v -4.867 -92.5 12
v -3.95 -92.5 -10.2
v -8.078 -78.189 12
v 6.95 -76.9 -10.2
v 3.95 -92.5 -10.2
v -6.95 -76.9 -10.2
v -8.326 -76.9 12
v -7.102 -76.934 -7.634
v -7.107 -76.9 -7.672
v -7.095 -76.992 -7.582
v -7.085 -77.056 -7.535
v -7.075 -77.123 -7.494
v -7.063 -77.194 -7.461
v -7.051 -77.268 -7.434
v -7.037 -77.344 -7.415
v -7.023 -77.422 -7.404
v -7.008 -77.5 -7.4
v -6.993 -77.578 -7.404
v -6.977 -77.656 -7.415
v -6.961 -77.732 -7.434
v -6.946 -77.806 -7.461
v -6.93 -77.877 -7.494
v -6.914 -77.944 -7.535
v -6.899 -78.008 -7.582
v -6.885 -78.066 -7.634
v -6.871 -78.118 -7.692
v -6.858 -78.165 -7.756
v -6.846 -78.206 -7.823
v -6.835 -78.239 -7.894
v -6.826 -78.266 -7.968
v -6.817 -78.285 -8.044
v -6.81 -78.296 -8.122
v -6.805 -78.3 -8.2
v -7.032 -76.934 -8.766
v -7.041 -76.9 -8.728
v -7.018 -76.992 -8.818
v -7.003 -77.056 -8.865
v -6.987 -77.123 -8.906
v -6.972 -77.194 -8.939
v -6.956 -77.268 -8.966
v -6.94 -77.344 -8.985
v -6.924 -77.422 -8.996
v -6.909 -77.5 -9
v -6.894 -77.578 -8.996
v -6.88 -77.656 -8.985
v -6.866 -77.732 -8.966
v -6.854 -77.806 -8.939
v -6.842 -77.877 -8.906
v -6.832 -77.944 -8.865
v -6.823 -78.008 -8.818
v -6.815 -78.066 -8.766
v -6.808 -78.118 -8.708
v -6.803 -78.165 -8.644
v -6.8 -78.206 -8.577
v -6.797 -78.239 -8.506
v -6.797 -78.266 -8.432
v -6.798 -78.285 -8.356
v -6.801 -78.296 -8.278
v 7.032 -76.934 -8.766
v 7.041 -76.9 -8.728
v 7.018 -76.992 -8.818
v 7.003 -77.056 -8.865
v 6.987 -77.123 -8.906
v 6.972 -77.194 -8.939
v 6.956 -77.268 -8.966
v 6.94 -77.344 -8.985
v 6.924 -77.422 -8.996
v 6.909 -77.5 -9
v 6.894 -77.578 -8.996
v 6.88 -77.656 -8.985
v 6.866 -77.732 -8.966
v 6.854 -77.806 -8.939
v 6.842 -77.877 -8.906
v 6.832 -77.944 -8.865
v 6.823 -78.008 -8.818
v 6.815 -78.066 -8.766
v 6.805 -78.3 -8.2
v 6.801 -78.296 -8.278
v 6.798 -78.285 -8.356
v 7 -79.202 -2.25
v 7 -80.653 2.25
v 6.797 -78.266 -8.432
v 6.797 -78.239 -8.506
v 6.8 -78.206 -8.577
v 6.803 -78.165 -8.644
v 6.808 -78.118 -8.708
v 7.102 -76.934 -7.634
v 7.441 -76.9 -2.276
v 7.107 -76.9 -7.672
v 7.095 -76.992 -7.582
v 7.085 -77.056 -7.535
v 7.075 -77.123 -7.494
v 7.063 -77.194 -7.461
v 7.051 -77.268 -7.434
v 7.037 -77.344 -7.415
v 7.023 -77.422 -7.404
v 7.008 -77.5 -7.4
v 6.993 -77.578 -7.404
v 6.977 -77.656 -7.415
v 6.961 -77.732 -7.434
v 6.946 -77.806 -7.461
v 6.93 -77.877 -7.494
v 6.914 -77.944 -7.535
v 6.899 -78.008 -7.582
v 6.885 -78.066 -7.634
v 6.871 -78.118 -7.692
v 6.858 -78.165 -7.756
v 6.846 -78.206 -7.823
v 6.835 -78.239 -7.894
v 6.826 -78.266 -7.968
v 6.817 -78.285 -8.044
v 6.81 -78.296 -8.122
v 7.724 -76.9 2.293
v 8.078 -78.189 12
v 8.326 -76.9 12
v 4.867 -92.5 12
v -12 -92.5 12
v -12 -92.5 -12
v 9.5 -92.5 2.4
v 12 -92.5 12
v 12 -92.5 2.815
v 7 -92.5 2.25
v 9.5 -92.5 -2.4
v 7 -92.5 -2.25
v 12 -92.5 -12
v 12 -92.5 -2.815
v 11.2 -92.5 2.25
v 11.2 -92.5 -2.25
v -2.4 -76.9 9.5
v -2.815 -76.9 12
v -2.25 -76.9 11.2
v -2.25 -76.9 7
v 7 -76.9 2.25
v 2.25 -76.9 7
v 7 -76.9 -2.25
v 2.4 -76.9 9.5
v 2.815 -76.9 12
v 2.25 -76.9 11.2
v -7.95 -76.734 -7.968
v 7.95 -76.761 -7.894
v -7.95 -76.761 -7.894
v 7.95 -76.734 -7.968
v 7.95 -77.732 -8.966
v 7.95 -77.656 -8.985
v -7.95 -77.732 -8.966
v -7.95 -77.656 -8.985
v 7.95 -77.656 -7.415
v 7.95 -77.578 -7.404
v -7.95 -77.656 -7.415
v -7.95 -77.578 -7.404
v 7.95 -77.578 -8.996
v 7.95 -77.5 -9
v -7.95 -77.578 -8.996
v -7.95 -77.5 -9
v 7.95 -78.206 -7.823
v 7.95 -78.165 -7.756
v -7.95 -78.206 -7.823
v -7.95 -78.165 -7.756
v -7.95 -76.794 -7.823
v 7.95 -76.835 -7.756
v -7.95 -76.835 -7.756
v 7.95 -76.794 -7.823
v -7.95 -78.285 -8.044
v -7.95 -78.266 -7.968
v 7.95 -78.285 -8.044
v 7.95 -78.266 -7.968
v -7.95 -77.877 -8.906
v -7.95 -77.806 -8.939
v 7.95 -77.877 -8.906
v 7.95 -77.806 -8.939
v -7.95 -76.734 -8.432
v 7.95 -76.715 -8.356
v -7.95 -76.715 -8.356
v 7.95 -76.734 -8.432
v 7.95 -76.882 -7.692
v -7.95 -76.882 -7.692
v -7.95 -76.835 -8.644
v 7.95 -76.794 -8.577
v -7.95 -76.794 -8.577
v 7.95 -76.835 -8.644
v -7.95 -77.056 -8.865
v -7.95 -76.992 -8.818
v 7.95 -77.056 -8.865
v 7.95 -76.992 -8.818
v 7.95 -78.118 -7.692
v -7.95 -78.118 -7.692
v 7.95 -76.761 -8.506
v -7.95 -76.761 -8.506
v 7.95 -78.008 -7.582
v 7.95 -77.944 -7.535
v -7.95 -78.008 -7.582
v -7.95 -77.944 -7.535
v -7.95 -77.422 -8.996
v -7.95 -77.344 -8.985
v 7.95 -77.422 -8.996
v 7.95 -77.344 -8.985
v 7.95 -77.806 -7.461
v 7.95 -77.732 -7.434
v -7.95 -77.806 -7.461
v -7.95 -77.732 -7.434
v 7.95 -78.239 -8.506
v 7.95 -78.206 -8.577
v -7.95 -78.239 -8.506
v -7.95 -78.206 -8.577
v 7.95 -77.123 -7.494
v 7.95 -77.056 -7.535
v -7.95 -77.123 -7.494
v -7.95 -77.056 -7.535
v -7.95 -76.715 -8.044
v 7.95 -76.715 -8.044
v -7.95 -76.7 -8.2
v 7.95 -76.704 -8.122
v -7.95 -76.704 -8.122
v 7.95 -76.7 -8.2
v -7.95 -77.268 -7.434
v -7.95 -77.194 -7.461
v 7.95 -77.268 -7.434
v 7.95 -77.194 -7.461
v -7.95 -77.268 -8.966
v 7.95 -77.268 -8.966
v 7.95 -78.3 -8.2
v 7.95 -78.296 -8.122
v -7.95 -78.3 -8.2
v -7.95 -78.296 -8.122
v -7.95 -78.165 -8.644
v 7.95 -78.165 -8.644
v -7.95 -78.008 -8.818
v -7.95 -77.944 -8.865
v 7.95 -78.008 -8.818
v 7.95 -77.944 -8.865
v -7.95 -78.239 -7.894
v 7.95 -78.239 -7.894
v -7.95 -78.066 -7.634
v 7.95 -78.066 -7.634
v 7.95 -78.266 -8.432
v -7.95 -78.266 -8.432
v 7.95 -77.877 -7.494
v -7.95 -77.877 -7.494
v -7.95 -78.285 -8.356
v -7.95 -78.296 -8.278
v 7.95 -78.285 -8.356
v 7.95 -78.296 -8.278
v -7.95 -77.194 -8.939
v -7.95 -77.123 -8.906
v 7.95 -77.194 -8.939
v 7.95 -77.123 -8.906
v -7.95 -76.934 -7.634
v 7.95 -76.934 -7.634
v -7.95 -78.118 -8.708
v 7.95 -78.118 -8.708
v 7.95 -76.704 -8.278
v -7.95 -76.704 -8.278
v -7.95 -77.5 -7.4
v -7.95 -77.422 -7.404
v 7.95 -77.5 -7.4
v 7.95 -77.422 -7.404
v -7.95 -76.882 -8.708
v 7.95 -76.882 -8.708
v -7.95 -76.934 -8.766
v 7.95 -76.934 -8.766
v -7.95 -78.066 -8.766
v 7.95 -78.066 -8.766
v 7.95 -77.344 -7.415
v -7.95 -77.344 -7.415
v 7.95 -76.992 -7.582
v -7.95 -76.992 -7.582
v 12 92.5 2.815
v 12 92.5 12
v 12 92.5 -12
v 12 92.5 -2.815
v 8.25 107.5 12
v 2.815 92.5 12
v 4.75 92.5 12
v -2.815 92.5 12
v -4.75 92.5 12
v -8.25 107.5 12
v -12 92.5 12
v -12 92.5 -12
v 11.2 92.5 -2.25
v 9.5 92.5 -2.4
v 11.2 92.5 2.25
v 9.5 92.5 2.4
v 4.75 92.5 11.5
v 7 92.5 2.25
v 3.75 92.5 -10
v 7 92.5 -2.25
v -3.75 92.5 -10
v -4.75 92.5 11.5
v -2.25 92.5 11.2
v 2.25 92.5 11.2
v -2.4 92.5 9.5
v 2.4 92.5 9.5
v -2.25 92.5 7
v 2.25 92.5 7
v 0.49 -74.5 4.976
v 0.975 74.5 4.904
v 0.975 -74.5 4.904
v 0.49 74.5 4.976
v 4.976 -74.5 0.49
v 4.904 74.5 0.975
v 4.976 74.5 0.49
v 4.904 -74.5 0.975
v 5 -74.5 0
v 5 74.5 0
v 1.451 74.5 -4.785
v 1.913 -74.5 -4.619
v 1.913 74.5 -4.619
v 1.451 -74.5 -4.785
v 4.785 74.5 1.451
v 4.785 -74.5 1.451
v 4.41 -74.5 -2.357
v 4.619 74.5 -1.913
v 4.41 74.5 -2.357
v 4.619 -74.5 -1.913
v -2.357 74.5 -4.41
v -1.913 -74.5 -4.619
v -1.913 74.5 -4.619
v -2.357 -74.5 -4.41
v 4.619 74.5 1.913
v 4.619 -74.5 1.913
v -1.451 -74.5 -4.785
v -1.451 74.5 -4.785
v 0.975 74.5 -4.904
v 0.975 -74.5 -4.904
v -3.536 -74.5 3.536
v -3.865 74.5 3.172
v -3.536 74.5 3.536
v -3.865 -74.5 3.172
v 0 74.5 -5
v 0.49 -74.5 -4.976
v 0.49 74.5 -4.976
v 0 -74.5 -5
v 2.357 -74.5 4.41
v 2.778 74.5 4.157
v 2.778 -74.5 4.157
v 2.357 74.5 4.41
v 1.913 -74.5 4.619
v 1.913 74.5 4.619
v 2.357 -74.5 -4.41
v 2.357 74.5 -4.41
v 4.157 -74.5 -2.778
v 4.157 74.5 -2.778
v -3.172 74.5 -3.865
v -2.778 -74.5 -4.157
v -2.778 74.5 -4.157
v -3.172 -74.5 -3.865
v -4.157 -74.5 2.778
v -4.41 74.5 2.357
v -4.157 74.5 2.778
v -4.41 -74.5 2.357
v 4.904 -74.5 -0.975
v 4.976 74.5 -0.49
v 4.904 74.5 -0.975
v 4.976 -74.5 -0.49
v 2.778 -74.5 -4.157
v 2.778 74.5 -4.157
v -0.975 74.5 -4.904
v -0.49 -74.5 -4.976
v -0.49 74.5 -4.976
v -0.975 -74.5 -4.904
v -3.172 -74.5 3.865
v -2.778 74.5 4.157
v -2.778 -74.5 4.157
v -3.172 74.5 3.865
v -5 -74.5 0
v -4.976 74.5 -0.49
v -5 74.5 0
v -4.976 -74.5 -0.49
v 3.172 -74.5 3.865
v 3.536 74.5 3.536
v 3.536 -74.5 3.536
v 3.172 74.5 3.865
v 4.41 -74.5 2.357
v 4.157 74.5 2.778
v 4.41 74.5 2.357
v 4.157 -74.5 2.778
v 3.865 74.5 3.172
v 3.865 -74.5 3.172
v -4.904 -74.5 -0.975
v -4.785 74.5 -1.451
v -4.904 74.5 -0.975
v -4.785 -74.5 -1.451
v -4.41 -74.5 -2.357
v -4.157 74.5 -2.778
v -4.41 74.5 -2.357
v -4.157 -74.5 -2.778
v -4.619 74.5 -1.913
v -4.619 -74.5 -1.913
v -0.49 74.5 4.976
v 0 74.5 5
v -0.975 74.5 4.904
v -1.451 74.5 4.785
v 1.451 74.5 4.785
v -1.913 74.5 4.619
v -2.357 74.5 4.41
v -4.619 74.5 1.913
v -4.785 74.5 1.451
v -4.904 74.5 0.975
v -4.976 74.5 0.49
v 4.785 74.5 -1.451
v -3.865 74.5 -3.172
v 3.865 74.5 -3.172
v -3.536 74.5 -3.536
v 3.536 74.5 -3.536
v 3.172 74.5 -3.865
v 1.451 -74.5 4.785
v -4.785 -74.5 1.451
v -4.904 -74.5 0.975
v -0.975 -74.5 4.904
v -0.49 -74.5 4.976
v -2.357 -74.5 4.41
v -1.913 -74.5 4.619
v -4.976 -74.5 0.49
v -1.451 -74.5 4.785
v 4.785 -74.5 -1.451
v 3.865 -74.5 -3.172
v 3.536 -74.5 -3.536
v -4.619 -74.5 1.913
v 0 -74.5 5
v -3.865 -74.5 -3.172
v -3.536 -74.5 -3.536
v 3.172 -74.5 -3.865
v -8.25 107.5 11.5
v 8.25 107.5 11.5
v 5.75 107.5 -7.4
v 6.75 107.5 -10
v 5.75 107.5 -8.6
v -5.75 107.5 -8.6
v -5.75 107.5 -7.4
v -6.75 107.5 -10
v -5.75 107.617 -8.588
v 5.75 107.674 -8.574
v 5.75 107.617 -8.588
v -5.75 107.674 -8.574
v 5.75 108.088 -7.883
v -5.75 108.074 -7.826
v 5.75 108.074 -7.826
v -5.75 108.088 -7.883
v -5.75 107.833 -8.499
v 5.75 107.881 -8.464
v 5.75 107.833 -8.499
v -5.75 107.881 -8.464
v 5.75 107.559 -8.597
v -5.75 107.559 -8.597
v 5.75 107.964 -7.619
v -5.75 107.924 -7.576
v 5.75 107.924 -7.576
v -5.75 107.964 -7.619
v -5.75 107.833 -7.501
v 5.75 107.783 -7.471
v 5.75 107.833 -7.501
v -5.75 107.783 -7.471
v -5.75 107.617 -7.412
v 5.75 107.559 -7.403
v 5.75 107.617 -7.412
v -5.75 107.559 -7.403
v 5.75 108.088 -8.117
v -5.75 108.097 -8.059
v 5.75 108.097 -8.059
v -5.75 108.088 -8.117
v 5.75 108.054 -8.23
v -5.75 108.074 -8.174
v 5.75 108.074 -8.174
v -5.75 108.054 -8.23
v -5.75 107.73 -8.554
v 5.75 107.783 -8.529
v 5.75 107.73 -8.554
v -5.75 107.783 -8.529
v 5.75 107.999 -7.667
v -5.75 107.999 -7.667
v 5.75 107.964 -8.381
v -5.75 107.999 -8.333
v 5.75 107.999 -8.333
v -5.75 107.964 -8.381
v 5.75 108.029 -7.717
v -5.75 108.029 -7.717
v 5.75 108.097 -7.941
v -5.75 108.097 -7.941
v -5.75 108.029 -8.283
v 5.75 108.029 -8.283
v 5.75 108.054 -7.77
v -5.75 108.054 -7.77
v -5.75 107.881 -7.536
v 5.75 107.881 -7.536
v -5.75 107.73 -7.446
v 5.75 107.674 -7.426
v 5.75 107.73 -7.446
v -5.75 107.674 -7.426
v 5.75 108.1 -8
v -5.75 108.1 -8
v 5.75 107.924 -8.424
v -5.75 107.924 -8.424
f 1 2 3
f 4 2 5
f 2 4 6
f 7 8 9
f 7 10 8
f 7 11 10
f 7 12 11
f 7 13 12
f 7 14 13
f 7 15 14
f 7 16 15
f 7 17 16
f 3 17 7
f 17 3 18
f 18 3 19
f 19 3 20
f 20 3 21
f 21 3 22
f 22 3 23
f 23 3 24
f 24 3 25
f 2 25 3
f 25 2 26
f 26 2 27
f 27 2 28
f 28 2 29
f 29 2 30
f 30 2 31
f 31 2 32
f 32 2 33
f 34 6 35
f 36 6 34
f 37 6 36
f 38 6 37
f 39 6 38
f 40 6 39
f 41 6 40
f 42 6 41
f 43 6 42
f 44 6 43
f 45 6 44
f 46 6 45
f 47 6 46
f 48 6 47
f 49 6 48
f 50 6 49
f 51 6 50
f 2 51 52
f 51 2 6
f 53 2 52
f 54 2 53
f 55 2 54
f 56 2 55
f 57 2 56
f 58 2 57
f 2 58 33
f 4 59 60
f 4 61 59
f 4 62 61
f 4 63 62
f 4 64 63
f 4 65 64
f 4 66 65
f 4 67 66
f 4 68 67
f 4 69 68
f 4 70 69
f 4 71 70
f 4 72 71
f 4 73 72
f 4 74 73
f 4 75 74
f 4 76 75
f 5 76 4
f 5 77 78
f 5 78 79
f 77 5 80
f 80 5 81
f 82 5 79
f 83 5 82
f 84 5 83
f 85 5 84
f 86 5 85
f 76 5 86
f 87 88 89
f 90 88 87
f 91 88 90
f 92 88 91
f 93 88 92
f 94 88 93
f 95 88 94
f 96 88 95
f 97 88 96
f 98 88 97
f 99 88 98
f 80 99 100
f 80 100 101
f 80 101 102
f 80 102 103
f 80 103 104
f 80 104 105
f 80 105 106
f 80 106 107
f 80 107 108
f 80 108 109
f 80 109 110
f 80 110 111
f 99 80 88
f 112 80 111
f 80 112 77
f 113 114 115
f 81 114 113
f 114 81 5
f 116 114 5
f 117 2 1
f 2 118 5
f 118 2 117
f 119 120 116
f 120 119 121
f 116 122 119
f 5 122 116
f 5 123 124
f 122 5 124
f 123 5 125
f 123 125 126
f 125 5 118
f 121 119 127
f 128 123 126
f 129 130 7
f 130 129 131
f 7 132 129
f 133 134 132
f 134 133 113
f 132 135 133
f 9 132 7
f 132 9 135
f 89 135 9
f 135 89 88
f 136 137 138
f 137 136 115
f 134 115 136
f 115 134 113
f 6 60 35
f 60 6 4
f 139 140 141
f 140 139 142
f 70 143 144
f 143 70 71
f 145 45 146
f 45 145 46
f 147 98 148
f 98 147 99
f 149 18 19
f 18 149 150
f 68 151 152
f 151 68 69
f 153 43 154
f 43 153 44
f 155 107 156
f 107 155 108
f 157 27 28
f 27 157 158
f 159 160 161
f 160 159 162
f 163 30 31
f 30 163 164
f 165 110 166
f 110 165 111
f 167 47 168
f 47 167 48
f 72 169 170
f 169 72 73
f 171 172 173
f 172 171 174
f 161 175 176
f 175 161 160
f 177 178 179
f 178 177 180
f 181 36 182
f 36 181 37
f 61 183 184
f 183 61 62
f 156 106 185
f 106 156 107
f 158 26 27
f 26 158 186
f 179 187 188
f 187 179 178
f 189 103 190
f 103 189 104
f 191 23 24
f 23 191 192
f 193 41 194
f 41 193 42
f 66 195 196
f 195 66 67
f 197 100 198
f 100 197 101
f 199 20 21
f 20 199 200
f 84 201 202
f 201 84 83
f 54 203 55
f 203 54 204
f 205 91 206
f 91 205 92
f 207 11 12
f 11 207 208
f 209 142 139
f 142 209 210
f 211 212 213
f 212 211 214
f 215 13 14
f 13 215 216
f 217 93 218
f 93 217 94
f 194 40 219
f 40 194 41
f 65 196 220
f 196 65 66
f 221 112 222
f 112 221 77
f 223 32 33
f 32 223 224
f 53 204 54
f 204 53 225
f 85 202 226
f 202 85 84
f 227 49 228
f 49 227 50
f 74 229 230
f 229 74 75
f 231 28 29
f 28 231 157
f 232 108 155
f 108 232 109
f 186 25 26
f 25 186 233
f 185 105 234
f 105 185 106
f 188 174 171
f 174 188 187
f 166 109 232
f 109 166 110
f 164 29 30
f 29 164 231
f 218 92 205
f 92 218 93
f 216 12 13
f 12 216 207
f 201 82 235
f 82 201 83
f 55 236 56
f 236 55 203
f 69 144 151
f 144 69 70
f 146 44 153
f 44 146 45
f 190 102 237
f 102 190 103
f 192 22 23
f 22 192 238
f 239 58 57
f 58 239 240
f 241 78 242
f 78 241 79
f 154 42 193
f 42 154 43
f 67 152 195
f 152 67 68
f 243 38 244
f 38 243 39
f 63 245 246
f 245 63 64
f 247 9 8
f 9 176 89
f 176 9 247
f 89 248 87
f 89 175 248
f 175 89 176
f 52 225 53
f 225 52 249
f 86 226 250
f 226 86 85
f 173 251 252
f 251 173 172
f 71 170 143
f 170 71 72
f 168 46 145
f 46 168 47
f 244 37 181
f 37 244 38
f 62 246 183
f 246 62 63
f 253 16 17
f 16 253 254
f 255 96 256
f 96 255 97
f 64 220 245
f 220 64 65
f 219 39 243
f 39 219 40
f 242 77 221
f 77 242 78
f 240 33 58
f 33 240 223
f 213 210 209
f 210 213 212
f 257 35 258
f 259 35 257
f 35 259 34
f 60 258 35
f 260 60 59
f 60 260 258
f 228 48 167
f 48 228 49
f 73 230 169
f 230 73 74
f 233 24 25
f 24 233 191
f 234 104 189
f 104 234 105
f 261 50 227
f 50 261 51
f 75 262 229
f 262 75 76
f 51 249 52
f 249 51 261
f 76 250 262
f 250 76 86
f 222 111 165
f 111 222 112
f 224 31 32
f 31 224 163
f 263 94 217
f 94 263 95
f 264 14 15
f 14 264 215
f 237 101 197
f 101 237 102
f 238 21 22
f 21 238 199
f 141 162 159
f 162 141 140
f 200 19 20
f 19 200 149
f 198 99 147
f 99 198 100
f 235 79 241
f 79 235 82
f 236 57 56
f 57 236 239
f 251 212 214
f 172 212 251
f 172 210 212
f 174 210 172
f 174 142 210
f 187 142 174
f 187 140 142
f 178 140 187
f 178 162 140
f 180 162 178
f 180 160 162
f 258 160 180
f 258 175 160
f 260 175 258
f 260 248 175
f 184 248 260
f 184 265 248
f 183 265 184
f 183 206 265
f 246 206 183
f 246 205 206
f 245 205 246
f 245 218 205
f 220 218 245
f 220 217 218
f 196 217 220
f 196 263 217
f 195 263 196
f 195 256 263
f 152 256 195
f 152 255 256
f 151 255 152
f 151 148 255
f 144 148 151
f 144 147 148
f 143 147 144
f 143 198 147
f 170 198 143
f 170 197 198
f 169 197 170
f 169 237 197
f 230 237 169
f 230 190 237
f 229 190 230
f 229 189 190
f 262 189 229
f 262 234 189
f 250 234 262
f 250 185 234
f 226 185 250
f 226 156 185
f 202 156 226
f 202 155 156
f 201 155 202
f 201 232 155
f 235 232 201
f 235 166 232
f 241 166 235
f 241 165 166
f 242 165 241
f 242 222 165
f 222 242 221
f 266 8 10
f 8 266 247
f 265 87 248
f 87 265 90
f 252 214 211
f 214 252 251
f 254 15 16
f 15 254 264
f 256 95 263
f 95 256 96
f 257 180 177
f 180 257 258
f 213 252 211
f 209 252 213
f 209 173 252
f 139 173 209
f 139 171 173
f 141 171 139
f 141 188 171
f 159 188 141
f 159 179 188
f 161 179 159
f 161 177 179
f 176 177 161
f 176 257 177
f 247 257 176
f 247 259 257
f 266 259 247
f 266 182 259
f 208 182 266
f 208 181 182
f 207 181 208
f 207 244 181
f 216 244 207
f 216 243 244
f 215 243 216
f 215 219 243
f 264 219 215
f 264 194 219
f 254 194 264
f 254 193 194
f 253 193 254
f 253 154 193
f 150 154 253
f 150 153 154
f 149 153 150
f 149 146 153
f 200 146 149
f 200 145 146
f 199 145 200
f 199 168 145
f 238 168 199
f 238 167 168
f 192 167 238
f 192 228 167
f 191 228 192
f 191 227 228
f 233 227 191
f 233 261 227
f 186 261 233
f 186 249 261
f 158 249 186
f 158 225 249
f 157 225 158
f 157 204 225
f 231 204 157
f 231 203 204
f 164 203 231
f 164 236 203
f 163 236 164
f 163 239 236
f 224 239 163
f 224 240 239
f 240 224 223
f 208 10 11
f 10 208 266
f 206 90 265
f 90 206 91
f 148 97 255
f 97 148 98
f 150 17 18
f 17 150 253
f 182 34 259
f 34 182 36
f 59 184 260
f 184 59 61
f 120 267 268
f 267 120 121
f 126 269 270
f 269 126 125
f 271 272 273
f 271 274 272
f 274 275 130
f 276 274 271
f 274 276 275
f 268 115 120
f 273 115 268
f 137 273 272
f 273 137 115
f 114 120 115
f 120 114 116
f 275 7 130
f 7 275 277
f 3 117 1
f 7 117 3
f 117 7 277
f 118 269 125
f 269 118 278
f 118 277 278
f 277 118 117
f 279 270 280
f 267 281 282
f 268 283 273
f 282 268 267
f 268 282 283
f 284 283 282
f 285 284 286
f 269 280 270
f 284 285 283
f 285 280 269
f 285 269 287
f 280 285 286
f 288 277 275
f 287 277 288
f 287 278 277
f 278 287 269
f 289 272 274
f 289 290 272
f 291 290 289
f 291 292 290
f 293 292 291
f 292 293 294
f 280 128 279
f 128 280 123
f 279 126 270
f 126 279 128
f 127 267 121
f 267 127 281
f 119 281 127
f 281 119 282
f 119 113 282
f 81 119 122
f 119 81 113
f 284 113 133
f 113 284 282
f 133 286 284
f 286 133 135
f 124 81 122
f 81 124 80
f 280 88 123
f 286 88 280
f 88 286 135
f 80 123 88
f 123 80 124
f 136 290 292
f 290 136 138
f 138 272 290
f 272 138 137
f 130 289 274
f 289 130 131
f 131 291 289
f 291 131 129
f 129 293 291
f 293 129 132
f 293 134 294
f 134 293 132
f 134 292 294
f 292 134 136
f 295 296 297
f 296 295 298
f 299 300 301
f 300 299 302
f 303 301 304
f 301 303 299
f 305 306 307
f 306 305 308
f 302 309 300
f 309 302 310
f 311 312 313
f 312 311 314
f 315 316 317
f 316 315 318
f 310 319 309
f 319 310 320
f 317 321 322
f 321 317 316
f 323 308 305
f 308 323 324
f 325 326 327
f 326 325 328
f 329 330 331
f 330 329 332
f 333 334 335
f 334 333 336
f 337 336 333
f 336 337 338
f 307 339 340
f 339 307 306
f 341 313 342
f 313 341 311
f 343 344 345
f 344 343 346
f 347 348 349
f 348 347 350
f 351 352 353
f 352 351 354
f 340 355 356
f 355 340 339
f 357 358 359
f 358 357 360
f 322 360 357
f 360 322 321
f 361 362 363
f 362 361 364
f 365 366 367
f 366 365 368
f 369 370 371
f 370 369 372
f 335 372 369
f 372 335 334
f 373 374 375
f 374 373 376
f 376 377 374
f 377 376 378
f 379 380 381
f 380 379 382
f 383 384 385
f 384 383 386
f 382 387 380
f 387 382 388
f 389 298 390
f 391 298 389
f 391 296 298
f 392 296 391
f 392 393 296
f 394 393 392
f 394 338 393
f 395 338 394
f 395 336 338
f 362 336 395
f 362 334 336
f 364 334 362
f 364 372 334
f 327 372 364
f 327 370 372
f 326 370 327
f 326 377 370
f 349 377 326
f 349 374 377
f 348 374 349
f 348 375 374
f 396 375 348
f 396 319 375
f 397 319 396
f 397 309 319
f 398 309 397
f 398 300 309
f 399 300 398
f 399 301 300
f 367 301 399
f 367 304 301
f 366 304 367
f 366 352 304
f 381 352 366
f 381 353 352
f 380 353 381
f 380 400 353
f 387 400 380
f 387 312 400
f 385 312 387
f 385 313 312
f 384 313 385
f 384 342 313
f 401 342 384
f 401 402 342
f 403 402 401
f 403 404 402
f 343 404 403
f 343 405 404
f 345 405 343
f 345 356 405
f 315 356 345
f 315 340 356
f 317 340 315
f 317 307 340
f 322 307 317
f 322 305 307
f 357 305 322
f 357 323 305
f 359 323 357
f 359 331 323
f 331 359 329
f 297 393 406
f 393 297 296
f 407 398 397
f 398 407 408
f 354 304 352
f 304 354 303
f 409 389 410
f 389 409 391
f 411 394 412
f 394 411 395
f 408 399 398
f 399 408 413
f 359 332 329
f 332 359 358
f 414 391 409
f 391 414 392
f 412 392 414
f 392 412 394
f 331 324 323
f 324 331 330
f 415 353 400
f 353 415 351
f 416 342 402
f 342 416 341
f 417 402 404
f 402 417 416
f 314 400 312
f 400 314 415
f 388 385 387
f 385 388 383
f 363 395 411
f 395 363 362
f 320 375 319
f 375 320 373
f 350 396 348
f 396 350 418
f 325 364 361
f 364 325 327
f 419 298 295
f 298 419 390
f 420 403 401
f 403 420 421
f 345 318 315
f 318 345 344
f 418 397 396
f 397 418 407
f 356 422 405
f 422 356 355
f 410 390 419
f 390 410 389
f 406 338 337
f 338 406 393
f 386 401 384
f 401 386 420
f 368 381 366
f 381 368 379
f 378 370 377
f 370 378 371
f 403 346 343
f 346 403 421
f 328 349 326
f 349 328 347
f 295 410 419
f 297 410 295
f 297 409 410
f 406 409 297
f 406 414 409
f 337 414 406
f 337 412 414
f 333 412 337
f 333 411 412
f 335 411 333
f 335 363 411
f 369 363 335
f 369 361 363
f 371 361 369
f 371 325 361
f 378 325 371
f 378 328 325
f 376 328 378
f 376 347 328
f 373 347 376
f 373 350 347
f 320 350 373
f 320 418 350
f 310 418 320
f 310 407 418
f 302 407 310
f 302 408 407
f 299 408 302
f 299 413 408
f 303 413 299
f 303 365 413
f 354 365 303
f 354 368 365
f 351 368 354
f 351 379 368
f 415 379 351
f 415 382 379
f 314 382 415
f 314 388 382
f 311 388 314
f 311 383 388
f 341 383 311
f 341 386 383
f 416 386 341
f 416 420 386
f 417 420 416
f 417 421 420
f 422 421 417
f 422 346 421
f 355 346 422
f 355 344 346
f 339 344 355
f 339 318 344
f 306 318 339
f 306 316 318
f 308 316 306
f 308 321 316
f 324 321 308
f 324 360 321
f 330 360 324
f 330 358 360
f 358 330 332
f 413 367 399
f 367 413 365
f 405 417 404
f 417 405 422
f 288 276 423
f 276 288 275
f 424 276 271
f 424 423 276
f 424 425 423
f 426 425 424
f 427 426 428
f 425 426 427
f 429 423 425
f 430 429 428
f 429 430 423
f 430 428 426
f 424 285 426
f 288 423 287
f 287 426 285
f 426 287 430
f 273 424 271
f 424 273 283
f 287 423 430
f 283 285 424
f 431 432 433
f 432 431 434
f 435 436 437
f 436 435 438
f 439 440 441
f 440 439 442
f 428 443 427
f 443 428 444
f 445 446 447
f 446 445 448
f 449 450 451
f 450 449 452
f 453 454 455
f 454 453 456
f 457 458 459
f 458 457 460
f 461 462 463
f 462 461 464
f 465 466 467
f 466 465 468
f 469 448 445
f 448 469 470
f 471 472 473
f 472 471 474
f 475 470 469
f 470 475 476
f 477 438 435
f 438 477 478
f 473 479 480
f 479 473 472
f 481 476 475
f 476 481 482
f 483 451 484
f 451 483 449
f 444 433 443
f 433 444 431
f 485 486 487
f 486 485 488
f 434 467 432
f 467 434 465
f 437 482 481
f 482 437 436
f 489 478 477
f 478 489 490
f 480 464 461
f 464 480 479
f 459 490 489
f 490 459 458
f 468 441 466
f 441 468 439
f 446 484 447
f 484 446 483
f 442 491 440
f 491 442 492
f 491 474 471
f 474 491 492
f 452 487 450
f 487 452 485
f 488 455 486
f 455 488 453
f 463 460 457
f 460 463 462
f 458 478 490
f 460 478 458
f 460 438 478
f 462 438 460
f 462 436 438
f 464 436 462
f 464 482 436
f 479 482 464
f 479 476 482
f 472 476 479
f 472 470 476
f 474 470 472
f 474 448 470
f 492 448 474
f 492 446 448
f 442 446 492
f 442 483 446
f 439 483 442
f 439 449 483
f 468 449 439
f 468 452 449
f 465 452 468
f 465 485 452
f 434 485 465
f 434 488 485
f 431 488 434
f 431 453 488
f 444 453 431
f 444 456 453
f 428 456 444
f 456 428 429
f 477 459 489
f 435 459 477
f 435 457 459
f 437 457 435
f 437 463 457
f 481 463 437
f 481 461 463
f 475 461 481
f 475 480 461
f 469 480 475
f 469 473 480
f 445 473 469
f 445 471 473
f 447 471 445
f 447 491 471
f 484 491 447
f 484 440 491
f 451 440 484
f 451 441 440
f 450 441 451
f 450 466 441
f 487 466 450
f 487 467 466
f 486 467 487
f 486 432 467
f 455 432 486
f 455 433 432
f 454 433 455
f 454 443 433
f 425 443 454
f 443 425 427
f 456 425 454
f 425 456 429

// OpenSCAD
// file: ../modules/spline_profile.scad
// ====================================================================
// Cellophane Spline Groove & Compliant Spring Clamping Strip Module
// High-tension retention system with compliant split-core spring prongs
// and directional grip teeth to hold cellophane drum-tight without slipping
// ====================================================================
include <../config.scad>

// Negative volume for cutting the spline groove into any beam surface
// Cuts into the -Z direction from Z=0.
// Axis parameter: "Y" (default) or "X"
module spline_groove_negative(length = 100, axis = "Y") {
    gw = GROOVE_WIDTH; // 4.5 mm
    gd = GROOVE_DEPTH; // 5.0 mm
    
    // Cross-section profile of the groove (in X-Z plane)
    // Features a 45° lead-in chamfer at the mouth and internal retention undercuts
    module groove_cross_section_2d() {
        polygon(points = [
            [-(gw/2 + 0.6),  0.05], // Mouth chamfer outer left
            [-gw/2,         -0.80], // Mouth chamfer inner left
            [-gw/2 - 0.15,  -2.50], // Mid retention undercut left
            [-gw/2,         -gd],   // Bottom left
            [ gw/2,         -gd],   // Bottom right
            [ gw/2 + 0.15,  -2.50], // Mid retention undercut right
            [ gw/2,         -0.80], // Mouth chamfer inner right
            [ (gw/2 + 0.6),  0.05]  // Mouth chamfer outer right
        ]);
    }
    
    if (axis == "Y") {
        rotate([90, 0, 0])
        linear_extrude(height = length, center = true) {
            groove_cross_section_2d();
        }
    } else {
        rotate([0, 90, 0])
        rotate([0, 0, 90])
        linear_extrude(height = length, center = true) {
            groove_cross_section_2d();
        }
    }
}

// 2D Profile of the Compliant Spring-Wedge Spline Clip (X-Z plane)
// Has a central vertical expansion slot that allows the two prongs to flex inward
// during insertion and exert continuous outward spring pressure against the cellophane.
module spline_clip_profile_2d(width_offset = 0) {
    w_cap   = 7.0; // Top thumb-press cap width
    h_cap   = 1.8; // Cap thickness
    h_depth = 4.6; // Insertion depth
    
    // Base dimensions + user/grip offset
    w_shaft = 4.3 + width_offset; // Base shaft (tight fit in 4.5mm groove)
    w_barb1 = 4.7 + width_offset; // Upper retention barb (interferes with groove)
    w_barb2 = 4.8 + width_offset; // Lower primary clamping barb
    w_nose  = 3.2;                // Lead-in nose
    
    difference() {
        union() {
            // 1. Top Thumb-Press Cap (acts as depth stop & pry lip)
            translate([0, h_cap / 2])
            hull() {
                translate([-w_cap/2 + 0.8, -h_cap/2 + 0.4]) circle(r = 0.4, $fn=16);
                translate([ w_cap/2 - 0.8, -h_cap/2 + 0.4]) circle(r = 0.4, $fn=16);
                translate([-w_cap/2 + 1.2,  h_cap/2 - 0.4]) circle(r = 0.4, $fn=16);
                translate([ w_cap/2 - 1.2,  h_cap/2 - 0.4]) circle(r = 0.4, $fn=16);
            }
            
            // 2. Dual-Barb Clamping Prongs
            polygon(points = [
                [-w_shaft/2,        0.0],
                [-w_shaft/2,       -1.2],
                [-w_barb1/2,       -1.9], // Upper barb tooth
                [-w_shaft/2,       -2.1],
                [-w_shaft/2,       -2.8],
                [-w_barb2/2,       -3.5], // Lower primary clamping tooth
                [-w_nose/2,        -h_depth], // Tapered nose
                [ w_nose/2,        -h_depth],
                [ w_barb2/2,       -3.5],
                [ w_shaft/2,       -2.8],
                [ w_shaft/2,       -2.1],
                [ w_barb1/2,       -1.9],
                [ w_shaft/2,       -1.2],
                [ w_shaft/2,        0.0]
            ]);
        }
        
        // 3. Central Vertical Expansion Kerf (0.9 mm compliant flex slot)
        // Splits the shaft into two spring prongs that flex inward upon insertion
        translate([0, -h_depth/2 - 0.6])
        hull() {
            translate([0,  h_depth/2 - 1.2]) circle(r = 0.45, $fn=16);
            translate([0, -h_depth/2 + 0.5]) circle(r = 0.45, $fn=16);
        }
    }
}

// 3D Snap-in Locking Spline Clip (oriented along Y axis by default)
module spline_clip(length = 150, axis = "Y", width_offset = 0) {
    if (axis == "Y") {
        rotate([90, 0, 0])
        linear_extrude(height = length, center = true) {
            spline_clip_profile_2d(width_offset = width_offset);
        }
    } else {
        rotate([0, 90, 0])
        rotate([0, 0, 90])
        linear_extrude(height = length, center = true) {
            spline_clip_profile_2d(width_offset = width_offset);
        }
    }
}
// file: ../modules/dovetail.scad
// ====================================================================
// Dual-Taper Wedge Dovetail Module (Peg-Free, Self-Locking)
// Main Frame Wedge & Mini Door Wedge Systems
// ====================================================================
include <../config.scad>

// 2D Profile of Dovetail Slice in X-Y plane
module dovetail_slice_2d(root_w, tip_w, depth) {
    w_r = root_w / 2;
    w_t = tip_w / 2;
    polygon(points = [
        [-w_r, 0],
        [-w_t, depth],
        [ w_t, depth],
        [ w_r, 0]
    ]);
}

// ----------------------------------------------------
// 1. Main Frame Dual-Taper Wedge Dovetail (24 x 24 mm Profile)
// ----------------------------------------------------
module male_dovetail(
    w = BEAM_WIDTH,
    h = BEAM_HEIGHT,
    depth = DOVETAIL_DEPTH,
    tol = 0
) {
    z_bot = -h/2 + 2.0 + tol; // 2mm bottom ledge
    z_top =  h/2 - tol;       // Flush at top of beam
    
    b_root = FRAME_BOT_ROOT - 2*tol;
    b_tip  = FRAME_BOT_TIP  - 2*tol;
    t_root = FRAME_TOP_ROOT - 2*tol;
    t_tip  = FRAME_TOP_TIP  - 2*tol;
    
    union() {
        hull() {
            translate([0, 0, z_bot])
            linear_extrude(height = 0.5)
            dovetail_slice_2d(b_root, b_tip, depth);
            
            translate([0, 0, z_top - 0.5])
            linear_extrude(height = 0.5)
            dovetail_slice_2d(t_root, t_tip, depth);
        }
        
        // Tactile snap detent bead on the tip face at the bottom
        translate([0, depth, z_bot + 2.0])
        rotate([0, 90, 0])
        cylinder(r = 0.6, h = b_tip - 2, center = true);
    }
}

module female_dovetail_pocket(
    w = BEAM_WIDTH,
    h = BEAM_HEIGHT,
    depth = DOVETAIL_DEPTH,
    tol = TOL_DOVETAIL
) {
    z_bot = -h/2 + 2.0 - tol;
    z_top =  h/2 + 2.0; // Open through top
    
    b_root = FRAME_BOT_ROOT + 2*tol;
    b_tip  = FRAME_BOT_TIP  + 2*tol;
    t_root = FRAME_TOP_ROOT + 2*tol;
    t_tip  = FRAME_TOP_TIP  + 2*tol;
    
    union() {
        mirror([0, 1, 0])
        hull() {
            translate([0, 0, z_bot])
            linear_extrude(height = 0.5)
            dovetail_slice_2d(b_root, b_tip, depth + 0.6);
            
            translate([0, 0, z_top])
            linear_extrude(height = 0.5)
            dovetail_slice_2d(t_root, t_tip, depth + 0.6);
        }
        
        // Matching snap detent groove in the pocket floor
        translate([0, -depth, z_bot + 2.0])
        rotate([0, 90, 0])
        cylinder(r = 0.8, h = b_tip + 2, center = true);
    }
}

// ----------------------------------------------------
// 2. Mini Door Dual-Taper Wedge Dovetail (18 x 16 mm Profile)
// ----------------------------------------------------
module mini_male_dovetail(
    w = DOOR_PROFILE_W,
    h = DOOR_PROFILE_T,
    depth = DOOR_DEPTH,
    tol = 0
) {
    z_bot = -h/2 + 1.5 + tol;
    z_top =  h/2 - tol;
    
    b_root = DOOR_BOT_ROOT - 2*tol;
    b_tip  = DOOR_BOT_TIP  - 2*tol;
    t_root = DOOR_TOP_ROOT - 2*tol;
    t_tip  = DOOR_TOP_TIP  - 2*tol;
    
    union() {
        hull() {
            translate([0, 0, z_bot])
            linear_extrude(height = 0.5)
            dovetail_slice_2d(b_root, b_tip, depth);
            
            translate([0, 0, z_top - 0.5])
            linear_extrude(height = 0.5)
            dovetail_slice_2d(t_root, t_tip, depth);
        }
        
        // Snap detent bead
        translate([0, depth, z_bot + 1.5])
        rotate([0, 90, 0])
        cylinder(r = 0.5, h = b_tip - 1.5, center = true);
    }
}

module mini_female_dovetail_pocket(
    w = DOOR_PROFILE_W,
    h = DOOR_PROFILE_T,
    depth = DOOR_DEPTH,
    tol = TOL_DOVETAIL
) {
    z_bot = -h/2 + 1.5 - tol;
    z_top =  h/2 + 2.0; // Open through top
    
    b_root = DOOR_BOT_ROOT + 2*tol;
    b_tip  = DOOR_BOT_TIP  + 2*tol;
    t_root = DOOR_TOP_ROOT + 2*tol;
    t_tip  = DOOR_TOP_TIP  + 2*tol;
    
    union() {
        mirror([0, 1, 0])
        hull() {
            translate([0, 0, z_bot])
            linear_extrude(height = 0.5)
            dovetail_slice_2d(b_root, b_tip, depth + 0.5);
            
            translate([0, 0, z_top])
            linear_extrude(height = 0.5)
            dovetail_slice_2d(t_root, t_tip, depth + 0.5);
        }
        
        // Matching detent groove
        translate([0, -depth, z_bot + 1.5])
        rotate([0, 90, 0])
        cylinder(r = 0.7, h = b_tip + 2, center = true);
    }
}
// file: ../config.scad
// ====================================================================
// Bambu Lab A1 Enclosure - Global Configuration Parameters
// Ultra-Minimal 8-Part Modular Kit (Face-Overlay Architecture)
// ====================================================================

// --- Print Bed Limits ---
MAX_PRINT_X = 256;
MAX_PRINT_Y = 256;
MAX_PRINT_Z = 256;
SAFE_PART_MAX_LEN = 240; // Conservative safety margin for brims

// --- Internal Enclosure Dimensions (mm) ---
// Sized for Bambu Lab A1 bed-slinger travel, right poop bucket, and top BMCU 370c
INTERNAL_WIDTH  = 560; // X axis clearance (A1 + toolhead + right poop bucket)
INTERNAL_DEPTH  = 580; // Y axis clearance (Bed travel + rear cable loop buffer)
INTERNAL_HEIGHT = 710; // Z axis clearance (Gantry + BMCU 370c rotating mount + spool)

// --- Standardized Modular Grid Lengths ---
FRAME_EDGE_LEN  = 185.0; // Standardized length for ALL frame edge segments
DOOR_EDGE_LEN   = 138.0; // Standardized length for ALL door/roof edge segments

// --- Frame Profile Dimensions ---
BEAM_WIDTH   = 24.0;  // Frame beam width X/Y (mm)
BEAM_HEIGHT  = 24.0;  // Frame beam height Z (mm)
CORNER_SIZE  = 36.0;  // 3-way cubic corner junction dimension

// --- Door Profile Dimensions (Slim Face-Overlay) ---
DOOR_PROFILE_W = 18.0; // Width across door frame face (mm)
DOOR_PROFILE_T = 16.0; // Thickness of door frame (mm)
DOOR_CORNER_W  = 25.0; // L-shaped door corner block dimension (mm)

// --- Tolerances (FDM 3D Printing tuned for Bambu Lab A1 0.4mm nozzle) ---
TOL_TIGHT    = 0.15; // Tight press fit (spline clips)
TOL_DOVETAIL = 0.20; // Sliding interlock fit (wedge dovetails)
TOL_HINGE    = 0.30; // Free rotating hinge pins
TOL_LOOSE    = 0.40; // Clearance gaps

// --- Cellophane Spline Groove Specifications ---
GROOVE_WIDTH  = 4.5; // Width of U-channel
GROOVE_DEPTH  = 5.0; // Depth of U-channel

// --- Peg-Free Dual-Taper Wedge Dovetail Dimensions ---
DOVETAIL_DEPTH = 15.0; // Length of wedge insert (mm)

// Main Frame Wedge Dovetail
FRAME_BOT_ROOT = 7.5;  // Bottom root width (narrow entry)
FRAME_BOT_TIP  = 13.5; // Bottom tip width
FRAME_TOP_ROOT = 9.5;  // Top root width (wide wedge lock)
FRAME_TOP_TIP  = 16.5; // Top tip width

// Mini Door Wedge Dovetail (scaled for 18x16 mm door profile)
DOOR_BOT_ROOT  = 5.5;
DOOR_BOT_TIP   = 9.5;
DOOR_TOP_ROOT  = 7.0;
DOOR_TOP_TIP   = 12.0;
DOOR_DEPTH     = 10.0;

// --- Filament PTFE Tube Routing (Bottom Side Beam) ---
PTFE_TUBE_OD  = 4.0; // Standard PTFE bowden tube outer diameter (mm)
PTFE_HOLE_DIA = 4.3; // Slip-fit through-hole diameter with retention grip
PTFE_TUBE_CNT = 4;   // 4 dedicated filament tubes for multi-material / drybox
PTFE_ANGLE    = 35;  // Upward angle toward toolhead/BMCU (degrees)

// --- Render Quality ($fn) ---
$fn = $preview ? 24 : 64;
// main file
// ====================================================================
// 2. Standard Frame Edge Strut (Part 2 of 8)
// Standardized 185 mm structural beam
// Features 2 spline slots on outside edges (+X and +Z faces)
// Features Male wedge on +Y end, Female open-top pocket on -Y end
// ====================================================================
include <../config.scad>
use <../modules/dovetail.scad>
use <../modules/spline_profile.scad>

module edge_standard(
    length = FRAME_EDGE_LEN,
    width  = BEAM_WIDTH,
    height = BEAM_HEIGHT,
    has_spline = true,
    has_spline_x = undef,
    has_spline_z = undef
) {
    spline_x = is_undef(has_spline_x) ? has_spline : has_spline_x;
    spline_z = is_undef(has_spline_z) ? has_spline : has_spline_z;

    difference() {
        // Main solid beam body
        cube([width, length, height], center = true);
        
        // Spline slot 1 on outside edge (+X face)
        if (spline_x) {
            translate([width/2, 0, 0])
            rotate([0, 90, 0])
            spline_groove_negative(length = length + 2, axis = "Y");
        }
        
        // Spline slot 2 on outside edge (+Z face)
        if (spline_z) {
            translate([0, 0, height/2])
            spline_groove_negative(length = length + 2, axis = "Y");
        }
        
        // Female open-top wedge pocket at -Y end
        translate([0, -length/2, 0])
        rotate([0, 0, 180])
        female_dovetail_pocket(w = width, h = height);
        
        // Internal weight reduction channel
        rotate([90, 0, 0])
        cylinder(d = 10, h = length - (DOVETAIL_DEPTH * 2 + 6), center = true);
    }
    
    // Male wedge tenon at +Y end
    translate([0, length/2, 0])
    male_dovetail(w = width, h = height);
}

// Standalone preview
edge_standard();
